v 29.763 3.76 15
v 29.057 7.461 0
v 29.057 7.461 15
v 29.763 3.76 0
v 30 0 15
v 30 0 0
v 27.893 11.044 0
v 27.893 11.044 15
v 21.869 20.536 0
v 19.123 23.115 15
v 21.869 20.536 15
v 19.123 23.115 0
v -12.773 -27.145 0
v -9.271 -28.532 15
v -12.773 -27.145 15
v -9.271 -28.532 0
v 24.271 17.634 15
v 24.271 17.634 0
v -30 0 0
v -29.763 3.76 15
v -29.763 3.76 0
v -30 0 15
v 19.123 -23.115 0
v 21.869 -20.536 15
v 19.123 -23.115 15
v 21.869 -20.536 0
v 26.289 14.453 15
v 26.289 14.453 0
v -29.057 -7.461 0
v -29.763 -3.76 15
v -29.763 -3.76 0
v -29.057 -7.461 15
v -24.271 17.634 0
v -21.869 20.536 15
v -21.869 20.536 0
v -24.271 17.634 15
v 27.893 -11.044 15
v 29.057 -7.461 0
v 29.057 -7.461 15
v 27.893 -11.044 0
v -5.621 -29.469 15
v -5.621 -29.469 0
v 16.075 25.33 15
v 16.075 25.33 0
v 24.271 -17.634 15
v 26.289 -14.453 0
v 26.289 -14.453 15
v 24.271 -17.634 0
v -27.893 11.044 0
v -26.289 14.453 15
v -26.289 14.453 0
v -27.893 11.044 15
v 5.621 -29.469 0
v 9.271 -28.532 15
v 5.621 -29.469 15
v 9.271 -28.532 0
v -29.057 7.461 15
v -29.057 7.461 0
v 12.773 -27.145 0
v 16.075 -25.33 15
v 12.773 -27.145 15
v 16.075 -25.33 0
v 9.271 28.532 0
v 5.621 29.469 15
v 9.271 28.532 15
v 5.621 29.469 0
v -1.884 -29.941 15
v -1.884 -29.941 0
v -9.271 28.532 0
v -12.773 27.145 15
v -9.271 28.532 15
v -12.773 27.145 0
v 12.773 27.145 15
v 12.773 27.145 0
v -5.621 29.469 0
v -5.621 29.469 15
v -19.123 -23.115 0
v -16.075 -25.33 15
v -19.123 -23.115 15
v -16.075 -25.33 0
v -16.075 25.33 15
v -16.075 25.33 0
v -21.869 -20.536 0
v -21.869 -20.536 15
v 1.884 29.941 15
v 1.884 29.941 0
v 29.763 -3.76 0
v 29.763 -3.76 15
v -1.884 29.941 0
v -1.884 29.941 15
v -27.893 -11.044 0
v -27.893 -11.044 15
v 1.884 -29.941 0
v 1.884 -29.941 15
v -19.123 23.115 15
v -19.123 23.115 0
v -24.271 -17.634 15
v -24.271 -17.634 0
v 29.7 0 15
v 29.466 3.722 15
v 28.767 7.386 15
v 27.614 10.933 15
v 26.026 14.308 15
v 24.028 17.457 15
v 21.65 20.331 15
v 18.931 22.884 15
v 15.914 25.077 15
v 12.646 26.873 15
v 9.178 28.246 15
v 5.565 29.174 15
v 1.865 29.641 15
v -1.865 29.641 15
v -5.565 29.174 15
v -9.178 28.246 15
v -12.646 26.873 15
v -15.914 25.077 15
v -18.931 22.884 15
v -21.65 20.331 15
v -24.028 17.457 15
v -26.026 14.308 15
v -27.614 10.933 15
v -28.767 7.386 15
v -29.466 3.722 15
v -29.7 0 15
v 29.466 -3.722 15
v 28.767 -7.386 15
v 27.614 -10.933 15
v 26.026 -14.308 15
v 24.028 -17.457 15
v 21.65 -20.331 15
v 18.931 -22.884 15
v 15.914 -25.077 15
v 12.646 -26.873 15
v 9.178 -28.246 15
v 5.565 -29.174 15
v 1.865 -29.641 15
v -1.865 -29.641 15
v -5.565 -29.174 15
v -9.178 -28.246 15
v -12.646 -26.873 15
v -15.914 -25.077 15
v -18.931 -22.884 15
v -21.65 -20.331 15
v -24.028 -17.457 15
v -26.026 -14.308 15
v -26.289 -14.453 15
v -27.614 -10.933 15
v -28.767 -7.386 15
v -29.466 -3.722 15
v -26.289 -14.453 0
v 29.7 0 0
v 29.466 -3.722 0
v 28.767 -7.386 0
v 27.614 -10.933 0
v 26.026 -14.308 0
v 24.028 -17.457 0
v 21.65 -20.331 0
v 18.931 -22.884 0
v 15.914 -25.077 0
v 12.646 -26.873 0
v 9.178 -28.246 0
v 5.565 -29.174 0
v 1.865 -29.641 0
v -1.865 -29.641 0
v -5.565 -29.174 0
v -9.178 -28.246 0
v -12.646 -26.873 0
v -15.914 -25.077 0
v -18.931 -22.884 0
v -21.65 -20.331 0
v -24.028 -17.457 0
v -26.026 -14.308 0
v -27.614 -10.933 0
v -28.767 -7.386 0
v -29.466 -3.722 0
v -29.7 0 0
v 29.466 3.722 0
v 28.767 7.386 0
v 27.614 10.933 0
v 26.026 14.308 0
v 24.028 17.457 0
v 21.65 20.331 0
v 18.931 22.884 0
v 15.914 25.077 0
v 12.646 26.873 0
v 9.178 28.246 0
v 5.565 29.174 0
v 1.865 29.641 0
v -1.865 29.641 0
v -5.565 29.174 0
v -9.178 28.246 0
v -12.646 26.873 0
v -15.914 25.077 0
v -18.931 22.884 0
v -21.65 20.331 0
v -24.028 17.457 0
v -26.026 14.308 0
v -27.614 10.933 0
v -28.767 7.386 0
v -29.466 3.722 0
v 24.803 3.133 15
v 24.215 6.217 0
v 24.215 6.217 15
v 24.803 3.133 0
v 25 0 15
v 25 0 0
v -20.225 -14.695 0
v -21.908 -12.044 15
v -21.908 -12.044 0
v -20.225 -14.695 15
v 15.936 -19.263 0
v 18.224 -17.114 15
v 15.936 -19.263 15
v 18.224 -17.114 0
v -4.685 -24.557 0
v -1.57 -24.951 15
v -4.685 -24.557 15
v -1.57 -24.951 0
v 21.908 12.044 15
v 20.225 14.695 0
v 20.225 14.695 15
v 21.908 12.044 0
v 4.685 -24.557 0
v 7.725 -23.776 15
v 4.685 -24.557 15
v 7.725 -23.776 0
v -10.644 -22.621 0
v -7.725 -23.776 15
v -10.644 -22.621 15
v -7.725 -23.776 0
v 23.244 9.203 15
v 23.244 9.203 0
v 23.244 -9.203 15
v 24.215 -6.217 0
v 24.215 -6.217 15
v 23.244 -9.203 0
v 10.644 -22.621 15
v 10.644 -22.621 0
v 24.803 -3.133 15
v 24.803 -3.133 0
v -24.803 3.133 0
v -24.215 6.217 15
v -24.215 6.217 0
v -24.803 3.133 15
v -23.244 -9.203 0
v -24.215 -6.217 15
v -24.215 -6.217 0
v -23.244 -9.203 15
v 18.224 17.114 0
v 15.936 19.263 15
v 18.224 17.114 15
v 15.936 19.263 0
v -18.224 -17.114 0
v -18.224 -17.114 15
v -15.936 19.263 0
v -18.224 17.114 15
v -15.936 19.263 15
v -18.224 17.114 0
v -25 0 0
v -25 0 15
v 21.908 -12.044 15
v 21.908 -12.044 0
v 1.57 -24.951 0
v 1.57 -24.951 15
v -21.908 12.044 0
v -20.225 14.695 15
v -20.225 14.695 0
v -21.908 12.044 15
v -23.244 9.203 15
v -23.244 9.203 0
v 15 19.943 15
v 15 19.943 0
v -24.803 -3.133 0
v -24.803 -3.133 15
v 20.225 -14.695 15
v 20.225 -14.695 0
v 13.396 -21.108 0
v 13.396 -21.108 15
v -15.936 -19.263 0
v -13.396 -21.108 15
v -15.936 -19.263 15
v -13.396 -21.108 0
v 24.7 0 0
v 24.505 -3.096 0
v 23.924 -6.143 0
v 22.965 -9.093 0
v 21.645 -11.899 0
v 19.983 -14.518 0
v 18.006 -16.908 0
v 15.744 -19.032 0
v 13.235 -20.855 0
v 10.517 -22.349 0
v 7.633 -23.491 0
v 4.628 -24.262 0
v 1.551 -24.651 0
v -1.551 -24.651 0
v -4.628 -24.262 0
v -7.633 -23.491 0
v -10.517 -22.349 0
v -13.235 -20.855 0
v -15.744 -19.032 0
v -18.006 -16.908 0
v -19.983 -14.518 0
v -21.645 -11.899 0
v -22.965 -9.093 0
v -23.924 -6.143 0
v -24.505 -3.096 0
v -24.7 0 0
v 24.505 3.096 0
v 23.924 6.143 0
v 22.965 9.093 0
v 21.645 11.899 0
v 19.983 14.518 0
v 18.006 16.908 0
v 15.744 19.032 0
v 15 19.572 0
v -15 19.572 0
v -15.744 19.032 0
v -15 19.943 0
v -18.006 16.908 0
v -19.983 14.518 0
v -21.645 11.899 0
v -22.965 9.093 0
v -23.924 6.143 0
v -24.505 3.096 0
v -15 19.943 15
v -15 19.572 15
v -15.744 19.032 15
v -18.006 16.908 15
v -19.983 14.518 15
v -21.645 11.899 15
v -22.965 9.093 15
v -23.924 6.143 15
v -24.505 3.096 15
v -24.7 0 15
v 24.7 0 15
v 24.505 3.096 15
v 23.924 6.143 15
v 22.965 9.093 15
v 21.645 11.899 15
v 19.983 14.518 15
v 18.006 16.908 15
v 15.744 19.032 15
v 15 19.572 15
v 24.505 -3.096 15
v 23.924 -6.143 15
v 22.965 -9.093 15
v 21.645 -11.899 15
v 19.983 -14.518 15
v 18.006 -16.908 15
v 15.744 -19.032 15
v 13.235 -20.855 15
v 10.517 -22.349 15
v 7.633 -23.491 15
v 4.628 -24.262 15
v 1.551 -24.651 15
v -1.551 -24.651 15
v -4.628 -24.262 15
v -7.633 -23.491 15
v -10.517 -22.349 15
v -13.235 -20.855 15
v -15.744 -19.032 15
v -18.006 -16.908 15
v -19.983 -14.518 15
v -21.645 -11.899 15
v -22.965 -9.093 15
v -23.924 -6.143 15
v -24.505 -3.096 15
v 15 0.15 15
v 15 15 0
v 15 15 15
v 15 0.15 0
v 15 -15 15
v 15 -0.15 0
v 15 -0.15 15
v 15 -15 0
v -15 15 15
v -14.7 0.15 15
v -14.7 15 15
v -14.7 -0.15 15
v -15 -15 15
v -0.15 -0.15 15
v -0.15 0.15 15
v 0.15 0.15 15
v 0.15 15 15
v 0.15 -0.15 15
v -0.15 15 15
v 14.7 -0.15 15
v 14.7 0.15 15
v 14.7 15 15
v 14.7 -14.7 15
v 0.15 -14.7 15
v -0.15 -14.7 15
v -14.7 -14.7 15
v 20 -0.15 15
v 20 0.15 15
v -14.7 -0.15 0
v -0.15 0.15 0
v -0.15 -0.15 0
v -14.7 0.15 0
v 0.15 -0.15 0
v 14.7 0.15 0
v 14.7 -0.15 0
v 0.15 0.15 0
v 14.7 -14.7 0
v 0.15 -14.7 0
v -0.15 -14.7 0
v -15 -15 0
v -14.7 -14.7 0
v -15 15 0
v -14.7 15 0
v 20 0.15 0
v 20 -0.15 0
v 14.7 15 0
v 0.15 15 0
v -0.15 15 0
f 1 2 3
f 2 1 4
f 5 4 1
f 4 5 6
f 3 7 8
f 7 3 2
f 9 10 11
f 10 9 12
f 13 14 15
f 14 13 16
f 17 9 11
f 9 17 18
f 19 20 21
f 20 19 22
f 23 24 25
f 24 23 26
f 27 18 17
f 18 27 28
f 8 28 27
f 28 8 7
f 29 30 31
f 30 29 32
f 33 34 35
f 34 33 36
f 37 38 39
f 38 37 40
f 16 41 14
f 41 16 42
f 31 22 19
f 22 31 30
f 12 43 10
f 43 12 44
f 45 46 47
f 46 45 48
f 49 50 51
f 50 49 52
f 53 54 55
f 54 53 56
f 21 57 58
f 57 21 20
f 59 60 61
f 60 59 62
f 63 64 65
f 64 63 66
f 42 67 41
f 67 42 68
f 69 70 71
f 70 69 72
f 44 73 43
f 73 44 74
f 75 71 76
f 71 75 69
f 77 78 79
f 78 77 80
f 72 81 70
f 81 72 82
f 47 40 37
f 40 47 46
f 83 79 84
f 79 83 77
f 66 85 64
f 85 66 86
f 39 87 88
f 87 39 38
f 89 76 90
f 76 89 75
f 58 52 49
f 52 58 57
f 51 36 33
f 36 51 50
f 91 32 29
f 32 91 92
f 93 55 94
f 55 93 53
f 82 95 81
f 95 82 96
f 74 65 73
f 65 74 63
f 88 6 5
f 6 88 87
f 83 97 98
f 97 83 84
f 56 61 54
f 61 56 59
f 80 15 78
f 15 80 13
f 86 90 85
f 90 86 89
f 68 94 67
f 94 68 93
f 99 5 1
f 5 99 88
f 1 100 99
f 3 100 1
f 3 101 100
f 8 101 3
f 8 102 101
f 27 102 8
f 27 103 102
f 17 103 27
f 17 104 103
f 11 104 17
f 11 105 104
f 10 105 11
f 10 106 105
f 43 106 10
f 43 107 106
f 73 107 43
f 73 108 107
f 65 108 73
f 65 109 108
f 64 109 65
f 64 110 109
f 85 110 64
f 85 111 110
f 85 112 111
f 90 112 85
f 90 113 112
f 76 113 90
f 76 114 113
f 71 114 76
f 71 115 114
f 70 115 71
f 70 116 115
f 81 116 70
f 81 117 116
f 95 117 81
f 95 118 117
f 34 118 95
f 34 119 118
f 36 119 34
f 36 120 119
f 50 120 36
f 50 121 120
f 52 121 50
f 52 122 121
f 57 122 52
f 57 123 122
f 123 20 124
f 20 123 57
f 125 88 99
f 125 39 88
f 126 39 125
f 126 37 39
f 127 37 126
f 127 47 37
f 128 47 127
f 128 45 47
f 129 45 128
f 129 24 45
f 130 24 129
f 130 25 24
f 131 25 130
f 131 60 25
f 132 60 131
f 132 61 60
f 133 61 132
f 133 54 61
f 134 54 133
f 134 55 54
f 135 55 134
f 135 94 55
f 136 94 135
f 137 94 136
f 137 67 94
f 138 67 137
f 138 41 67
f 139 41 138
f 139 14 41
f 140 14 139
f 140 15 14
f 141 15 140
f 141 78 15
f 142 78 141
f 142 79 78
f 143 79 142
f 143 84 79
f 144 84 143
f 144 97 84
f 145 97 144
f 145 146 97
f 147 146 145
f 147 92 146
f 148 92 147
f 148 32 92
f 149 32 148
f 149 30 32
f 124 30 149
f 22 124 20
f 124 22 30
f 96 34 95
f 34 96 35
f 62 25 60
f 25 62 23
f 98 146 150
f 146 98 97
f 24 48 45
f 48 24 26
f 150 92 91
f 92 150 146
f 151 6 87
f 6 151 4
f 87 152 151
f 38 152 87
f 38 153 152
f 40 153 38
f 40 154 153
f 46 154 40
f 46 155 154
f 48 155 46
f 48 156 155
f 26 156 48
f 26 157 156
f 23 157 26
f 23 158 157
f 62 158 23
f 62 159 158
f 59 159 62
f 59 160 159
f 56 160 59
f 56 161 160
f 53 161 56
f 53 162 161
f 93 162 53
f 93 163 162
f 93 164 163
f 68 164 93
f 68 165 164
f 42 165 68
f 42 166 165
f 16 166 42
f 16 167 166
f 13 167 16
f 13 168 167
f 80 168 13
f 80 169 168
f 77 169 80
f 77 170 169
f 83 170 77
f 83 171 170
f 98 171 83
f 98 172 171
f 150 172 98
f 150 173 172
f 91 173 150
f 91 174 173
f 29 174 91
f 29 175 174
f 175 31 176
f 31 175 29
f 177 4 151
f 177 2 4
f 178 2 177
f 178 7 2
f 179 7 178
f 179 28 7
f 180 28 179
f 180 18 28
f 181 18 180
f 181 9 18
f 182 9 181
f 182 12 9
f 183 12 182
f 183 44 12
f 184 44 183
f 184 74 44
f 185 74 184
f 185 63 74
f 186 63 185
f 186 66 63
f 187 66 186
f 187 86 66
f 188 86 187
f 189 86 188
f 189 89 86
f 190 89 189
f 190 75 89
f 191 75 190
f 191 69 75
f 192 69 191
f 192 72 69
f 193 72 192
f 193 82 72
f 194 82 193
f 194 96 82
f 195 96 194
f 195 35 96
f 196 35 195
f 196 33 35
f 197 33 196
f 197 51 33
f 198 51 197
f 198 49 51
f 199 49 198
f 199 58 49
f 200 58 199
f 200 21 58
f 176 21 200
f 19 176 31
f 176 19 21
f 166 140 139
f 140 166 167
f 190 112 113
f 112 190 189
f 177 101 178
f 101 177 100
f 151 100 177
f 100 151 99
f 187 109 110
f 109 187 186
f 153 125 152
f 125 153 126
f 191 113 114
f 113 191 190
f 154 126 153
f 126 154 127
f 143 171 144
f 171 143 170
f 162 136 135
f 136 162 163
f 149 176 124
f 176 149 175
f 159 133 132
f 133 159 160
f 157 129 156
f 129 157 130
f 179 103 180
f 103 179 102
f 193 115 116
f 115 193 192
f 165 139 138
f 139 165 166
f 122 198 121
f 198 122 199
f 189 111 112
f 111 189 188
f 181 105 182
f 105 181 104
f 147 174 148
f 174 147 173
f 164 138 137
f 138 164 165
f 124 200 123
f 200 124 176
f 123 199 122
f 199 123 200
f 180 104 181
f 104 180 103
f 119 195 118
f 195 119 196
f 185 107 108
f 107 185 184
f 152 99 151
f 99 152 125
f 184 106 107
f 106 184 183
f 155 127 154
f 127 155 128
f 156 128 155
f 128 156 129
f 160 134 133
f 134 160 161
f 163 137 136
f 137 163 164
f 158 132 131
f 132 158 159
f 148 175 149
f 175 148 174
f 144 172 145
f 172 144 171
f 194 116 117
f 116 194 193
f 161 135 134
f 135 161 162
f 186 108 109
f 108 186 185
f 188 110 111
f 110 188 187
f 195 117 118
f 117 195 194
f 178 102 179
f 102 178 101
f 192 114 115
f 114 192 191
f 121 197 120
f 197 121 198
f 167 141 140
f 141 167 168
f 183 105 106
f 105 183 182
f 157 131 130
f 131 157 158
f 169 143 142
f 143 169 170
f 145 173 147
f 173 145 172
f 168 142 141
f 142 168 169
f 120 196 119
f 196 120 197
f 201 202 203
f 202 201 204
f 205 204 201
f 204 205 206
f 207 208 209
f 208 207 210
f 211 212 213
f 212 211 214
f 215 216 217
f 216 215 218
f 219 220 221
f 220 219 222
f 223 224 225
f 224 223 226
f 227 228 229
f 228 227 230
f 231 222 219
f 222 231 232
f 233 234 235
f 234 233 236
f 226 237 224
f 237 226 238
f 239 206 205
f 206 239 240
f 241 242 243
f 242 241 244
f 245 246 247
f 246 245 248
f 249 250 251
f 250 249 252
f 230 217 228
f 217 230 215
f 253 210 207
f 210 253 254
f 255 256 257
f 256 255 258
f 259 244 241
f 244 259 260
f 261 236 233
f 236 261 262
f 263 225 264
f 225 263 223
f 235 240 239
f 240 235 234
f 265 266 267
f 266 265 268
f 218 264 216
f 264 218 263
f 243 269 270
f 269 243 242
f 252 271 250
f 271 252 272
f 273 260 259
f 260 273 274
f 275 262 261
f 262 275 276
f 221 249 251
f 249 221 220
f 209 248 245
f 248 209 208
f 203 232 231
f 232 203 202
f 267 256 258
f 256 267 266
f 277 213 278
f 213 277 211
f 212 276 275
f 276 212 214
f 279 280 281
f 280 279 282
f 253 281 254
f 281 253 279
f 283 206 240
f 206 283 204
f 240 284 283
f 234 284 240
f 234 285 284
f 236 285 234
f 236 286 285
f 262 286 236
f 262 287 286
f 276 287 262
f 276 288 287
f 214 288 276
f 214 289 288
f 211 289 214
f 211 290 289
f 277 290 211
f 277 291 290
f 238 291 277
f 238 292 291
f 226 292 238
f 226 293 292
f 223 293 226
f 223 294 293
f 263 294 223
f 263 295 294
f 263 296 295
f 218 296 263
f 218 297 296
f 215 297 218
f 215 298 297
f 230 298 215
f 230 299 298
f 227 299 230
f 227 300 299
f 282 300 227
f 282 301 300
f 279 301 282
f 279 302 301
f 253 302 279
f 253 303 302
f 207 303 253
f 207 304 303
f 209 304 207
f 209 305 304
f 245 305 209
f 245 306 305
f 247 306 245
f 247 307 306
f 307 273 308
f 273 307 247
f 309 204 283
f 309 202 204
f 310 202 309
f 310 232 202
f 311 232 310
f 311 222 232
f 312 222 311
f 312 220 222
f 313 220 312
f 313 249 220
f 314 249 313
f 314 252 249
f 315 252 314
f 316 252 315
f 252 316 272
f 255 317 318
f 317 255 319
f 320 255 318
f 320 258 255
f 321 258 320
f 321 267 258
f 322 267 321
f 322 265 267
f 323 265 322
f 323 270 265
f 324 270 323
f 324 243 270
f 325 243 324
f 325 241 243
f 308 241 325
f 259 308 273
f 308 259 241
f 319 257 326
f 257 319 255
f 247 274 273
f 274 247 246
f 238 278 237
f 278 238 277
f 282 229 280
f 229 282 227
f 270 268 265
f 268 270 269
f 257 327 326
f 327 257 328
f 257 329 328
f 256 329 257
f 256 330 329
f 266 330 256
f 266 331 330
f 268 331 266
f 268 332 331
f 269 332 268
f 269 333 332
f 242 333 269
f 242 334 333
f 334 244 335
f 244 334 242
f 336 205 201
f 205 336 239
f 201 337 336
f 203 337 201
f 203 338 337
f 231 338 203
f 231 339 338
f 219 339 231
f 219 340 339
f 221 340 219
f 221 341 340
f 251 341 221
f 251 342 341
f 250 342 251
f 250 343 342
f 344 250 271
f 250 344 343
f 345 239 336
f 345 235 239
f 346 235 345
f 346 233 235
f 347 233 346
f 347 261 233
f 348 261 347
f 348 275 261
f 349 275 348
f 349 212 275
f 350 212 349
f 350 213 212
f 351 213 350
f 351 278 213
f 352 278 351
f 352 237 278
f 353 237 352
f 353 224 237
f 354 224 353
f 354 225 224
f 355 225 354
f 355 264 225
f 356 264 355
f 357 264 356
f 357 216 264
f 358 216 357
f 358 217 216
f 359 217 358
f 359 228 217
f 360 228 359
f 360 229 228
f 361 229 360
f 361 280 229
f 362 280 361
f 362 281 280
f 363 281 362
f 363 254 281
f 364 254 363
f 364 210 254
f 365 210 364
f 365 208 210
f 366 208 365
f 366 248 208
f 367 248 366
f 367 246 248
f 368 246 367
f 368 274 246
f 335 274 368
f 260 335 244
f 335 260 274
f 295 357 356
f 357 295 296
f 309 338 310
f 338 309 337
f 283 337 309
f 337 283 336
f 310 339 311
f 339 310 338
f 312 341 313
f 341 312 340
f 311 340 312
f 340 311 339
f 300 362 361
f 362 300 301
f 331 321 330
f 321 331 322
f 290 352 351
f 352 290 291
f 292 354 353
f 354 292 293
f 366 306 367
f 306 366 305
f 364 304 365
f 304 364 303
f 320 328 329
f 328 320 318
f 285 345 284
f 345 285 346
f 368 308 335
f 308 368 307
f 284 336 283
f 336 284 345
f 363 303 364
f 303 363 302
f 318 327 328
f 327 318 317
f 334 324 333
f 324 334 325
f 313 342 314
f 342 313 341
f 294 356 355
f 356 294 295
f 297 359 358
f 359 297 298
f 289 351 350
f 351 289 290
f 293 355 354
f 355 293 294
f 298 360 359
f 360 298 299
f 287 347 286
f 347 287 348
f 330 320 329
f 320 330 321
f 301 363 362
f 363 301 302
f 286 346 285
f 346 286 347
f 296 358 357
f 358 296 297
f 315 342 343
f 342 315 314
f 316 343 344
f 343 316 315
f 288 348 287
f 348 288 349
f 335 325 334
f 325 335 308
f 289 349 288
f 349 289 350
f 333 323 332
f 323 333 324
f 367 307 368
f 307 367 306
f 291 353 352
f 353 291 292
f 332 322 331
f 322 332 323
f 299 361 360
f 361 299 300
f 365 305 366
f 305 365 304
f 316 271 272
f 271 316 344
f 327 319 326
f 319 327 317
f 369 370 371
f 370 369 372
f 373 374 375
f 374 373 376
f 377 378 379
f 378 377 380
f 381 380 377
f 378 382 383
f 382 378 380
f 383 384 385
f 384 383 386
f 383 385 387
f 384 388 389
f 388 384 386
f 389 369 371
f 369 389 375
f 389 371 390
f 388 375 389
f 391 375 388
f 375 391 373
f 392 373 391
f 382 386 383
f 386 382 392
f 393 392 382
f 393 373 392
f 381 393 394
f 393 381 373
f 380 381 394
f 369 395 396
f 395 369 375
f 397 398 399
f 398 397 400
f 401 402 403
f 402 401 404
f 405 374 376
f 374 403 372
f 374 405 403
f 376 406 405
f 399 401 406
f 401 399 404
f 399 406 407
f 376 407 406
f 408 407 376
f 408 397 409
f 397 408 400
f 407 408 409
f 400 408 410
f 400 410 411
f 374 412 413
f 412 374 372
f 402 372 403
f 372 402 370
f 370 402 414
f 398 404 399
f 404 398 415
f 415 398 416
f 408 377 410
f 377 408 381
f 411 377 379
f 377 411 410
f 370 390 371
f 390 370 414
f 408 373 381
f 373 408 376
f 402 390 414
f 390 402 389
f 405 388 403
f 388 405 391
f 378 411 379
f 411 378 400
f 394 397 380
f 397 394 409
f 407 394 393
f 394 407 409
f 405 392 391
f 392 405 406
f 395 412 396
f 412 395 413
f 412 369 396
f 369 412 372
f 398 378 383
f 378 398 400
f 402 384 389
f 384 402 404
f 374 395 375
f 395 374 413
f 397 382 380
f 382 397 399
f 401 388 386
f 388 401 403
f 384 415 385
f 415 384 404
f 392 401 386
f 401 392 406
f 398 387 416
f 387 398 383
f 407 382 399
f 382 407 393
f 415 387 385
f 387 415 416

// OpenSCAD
//SPUUUUUUURS
$fn = 50;

spurWidth = .3;

r1 = 30;
r2 = 25;
r3 = 15;

height = 15;

module tube(height, radius){
	difference(){
		cylinder(height, radius, radius);
		scale([1,1,2]) cylinder(height, radius-spurWidth, radius-spurWidth, center=true);
	}
}

tube(height, r1);
difference(){
	tube(height, r2);
	translate([0,r2,0]) cube(2*height, center=true);
}
union(){
	difference(){
		translate([0,0,.5*height]) cube([2*r3, 2*r3, height], center=true);
		translate([0,spurWidth,.5*height]) cube([2*r3-2*spurWidth, 2*r3, 2*height], center=true);
	}
	translate([-r3, -.5*spurWidth, 0]) cube([2*r3+.5*(r2-r3), spurWidth, height]);
	translate([0,0,.5*height]) cube([spurWidth, 2*r3, height], center=true);

}
